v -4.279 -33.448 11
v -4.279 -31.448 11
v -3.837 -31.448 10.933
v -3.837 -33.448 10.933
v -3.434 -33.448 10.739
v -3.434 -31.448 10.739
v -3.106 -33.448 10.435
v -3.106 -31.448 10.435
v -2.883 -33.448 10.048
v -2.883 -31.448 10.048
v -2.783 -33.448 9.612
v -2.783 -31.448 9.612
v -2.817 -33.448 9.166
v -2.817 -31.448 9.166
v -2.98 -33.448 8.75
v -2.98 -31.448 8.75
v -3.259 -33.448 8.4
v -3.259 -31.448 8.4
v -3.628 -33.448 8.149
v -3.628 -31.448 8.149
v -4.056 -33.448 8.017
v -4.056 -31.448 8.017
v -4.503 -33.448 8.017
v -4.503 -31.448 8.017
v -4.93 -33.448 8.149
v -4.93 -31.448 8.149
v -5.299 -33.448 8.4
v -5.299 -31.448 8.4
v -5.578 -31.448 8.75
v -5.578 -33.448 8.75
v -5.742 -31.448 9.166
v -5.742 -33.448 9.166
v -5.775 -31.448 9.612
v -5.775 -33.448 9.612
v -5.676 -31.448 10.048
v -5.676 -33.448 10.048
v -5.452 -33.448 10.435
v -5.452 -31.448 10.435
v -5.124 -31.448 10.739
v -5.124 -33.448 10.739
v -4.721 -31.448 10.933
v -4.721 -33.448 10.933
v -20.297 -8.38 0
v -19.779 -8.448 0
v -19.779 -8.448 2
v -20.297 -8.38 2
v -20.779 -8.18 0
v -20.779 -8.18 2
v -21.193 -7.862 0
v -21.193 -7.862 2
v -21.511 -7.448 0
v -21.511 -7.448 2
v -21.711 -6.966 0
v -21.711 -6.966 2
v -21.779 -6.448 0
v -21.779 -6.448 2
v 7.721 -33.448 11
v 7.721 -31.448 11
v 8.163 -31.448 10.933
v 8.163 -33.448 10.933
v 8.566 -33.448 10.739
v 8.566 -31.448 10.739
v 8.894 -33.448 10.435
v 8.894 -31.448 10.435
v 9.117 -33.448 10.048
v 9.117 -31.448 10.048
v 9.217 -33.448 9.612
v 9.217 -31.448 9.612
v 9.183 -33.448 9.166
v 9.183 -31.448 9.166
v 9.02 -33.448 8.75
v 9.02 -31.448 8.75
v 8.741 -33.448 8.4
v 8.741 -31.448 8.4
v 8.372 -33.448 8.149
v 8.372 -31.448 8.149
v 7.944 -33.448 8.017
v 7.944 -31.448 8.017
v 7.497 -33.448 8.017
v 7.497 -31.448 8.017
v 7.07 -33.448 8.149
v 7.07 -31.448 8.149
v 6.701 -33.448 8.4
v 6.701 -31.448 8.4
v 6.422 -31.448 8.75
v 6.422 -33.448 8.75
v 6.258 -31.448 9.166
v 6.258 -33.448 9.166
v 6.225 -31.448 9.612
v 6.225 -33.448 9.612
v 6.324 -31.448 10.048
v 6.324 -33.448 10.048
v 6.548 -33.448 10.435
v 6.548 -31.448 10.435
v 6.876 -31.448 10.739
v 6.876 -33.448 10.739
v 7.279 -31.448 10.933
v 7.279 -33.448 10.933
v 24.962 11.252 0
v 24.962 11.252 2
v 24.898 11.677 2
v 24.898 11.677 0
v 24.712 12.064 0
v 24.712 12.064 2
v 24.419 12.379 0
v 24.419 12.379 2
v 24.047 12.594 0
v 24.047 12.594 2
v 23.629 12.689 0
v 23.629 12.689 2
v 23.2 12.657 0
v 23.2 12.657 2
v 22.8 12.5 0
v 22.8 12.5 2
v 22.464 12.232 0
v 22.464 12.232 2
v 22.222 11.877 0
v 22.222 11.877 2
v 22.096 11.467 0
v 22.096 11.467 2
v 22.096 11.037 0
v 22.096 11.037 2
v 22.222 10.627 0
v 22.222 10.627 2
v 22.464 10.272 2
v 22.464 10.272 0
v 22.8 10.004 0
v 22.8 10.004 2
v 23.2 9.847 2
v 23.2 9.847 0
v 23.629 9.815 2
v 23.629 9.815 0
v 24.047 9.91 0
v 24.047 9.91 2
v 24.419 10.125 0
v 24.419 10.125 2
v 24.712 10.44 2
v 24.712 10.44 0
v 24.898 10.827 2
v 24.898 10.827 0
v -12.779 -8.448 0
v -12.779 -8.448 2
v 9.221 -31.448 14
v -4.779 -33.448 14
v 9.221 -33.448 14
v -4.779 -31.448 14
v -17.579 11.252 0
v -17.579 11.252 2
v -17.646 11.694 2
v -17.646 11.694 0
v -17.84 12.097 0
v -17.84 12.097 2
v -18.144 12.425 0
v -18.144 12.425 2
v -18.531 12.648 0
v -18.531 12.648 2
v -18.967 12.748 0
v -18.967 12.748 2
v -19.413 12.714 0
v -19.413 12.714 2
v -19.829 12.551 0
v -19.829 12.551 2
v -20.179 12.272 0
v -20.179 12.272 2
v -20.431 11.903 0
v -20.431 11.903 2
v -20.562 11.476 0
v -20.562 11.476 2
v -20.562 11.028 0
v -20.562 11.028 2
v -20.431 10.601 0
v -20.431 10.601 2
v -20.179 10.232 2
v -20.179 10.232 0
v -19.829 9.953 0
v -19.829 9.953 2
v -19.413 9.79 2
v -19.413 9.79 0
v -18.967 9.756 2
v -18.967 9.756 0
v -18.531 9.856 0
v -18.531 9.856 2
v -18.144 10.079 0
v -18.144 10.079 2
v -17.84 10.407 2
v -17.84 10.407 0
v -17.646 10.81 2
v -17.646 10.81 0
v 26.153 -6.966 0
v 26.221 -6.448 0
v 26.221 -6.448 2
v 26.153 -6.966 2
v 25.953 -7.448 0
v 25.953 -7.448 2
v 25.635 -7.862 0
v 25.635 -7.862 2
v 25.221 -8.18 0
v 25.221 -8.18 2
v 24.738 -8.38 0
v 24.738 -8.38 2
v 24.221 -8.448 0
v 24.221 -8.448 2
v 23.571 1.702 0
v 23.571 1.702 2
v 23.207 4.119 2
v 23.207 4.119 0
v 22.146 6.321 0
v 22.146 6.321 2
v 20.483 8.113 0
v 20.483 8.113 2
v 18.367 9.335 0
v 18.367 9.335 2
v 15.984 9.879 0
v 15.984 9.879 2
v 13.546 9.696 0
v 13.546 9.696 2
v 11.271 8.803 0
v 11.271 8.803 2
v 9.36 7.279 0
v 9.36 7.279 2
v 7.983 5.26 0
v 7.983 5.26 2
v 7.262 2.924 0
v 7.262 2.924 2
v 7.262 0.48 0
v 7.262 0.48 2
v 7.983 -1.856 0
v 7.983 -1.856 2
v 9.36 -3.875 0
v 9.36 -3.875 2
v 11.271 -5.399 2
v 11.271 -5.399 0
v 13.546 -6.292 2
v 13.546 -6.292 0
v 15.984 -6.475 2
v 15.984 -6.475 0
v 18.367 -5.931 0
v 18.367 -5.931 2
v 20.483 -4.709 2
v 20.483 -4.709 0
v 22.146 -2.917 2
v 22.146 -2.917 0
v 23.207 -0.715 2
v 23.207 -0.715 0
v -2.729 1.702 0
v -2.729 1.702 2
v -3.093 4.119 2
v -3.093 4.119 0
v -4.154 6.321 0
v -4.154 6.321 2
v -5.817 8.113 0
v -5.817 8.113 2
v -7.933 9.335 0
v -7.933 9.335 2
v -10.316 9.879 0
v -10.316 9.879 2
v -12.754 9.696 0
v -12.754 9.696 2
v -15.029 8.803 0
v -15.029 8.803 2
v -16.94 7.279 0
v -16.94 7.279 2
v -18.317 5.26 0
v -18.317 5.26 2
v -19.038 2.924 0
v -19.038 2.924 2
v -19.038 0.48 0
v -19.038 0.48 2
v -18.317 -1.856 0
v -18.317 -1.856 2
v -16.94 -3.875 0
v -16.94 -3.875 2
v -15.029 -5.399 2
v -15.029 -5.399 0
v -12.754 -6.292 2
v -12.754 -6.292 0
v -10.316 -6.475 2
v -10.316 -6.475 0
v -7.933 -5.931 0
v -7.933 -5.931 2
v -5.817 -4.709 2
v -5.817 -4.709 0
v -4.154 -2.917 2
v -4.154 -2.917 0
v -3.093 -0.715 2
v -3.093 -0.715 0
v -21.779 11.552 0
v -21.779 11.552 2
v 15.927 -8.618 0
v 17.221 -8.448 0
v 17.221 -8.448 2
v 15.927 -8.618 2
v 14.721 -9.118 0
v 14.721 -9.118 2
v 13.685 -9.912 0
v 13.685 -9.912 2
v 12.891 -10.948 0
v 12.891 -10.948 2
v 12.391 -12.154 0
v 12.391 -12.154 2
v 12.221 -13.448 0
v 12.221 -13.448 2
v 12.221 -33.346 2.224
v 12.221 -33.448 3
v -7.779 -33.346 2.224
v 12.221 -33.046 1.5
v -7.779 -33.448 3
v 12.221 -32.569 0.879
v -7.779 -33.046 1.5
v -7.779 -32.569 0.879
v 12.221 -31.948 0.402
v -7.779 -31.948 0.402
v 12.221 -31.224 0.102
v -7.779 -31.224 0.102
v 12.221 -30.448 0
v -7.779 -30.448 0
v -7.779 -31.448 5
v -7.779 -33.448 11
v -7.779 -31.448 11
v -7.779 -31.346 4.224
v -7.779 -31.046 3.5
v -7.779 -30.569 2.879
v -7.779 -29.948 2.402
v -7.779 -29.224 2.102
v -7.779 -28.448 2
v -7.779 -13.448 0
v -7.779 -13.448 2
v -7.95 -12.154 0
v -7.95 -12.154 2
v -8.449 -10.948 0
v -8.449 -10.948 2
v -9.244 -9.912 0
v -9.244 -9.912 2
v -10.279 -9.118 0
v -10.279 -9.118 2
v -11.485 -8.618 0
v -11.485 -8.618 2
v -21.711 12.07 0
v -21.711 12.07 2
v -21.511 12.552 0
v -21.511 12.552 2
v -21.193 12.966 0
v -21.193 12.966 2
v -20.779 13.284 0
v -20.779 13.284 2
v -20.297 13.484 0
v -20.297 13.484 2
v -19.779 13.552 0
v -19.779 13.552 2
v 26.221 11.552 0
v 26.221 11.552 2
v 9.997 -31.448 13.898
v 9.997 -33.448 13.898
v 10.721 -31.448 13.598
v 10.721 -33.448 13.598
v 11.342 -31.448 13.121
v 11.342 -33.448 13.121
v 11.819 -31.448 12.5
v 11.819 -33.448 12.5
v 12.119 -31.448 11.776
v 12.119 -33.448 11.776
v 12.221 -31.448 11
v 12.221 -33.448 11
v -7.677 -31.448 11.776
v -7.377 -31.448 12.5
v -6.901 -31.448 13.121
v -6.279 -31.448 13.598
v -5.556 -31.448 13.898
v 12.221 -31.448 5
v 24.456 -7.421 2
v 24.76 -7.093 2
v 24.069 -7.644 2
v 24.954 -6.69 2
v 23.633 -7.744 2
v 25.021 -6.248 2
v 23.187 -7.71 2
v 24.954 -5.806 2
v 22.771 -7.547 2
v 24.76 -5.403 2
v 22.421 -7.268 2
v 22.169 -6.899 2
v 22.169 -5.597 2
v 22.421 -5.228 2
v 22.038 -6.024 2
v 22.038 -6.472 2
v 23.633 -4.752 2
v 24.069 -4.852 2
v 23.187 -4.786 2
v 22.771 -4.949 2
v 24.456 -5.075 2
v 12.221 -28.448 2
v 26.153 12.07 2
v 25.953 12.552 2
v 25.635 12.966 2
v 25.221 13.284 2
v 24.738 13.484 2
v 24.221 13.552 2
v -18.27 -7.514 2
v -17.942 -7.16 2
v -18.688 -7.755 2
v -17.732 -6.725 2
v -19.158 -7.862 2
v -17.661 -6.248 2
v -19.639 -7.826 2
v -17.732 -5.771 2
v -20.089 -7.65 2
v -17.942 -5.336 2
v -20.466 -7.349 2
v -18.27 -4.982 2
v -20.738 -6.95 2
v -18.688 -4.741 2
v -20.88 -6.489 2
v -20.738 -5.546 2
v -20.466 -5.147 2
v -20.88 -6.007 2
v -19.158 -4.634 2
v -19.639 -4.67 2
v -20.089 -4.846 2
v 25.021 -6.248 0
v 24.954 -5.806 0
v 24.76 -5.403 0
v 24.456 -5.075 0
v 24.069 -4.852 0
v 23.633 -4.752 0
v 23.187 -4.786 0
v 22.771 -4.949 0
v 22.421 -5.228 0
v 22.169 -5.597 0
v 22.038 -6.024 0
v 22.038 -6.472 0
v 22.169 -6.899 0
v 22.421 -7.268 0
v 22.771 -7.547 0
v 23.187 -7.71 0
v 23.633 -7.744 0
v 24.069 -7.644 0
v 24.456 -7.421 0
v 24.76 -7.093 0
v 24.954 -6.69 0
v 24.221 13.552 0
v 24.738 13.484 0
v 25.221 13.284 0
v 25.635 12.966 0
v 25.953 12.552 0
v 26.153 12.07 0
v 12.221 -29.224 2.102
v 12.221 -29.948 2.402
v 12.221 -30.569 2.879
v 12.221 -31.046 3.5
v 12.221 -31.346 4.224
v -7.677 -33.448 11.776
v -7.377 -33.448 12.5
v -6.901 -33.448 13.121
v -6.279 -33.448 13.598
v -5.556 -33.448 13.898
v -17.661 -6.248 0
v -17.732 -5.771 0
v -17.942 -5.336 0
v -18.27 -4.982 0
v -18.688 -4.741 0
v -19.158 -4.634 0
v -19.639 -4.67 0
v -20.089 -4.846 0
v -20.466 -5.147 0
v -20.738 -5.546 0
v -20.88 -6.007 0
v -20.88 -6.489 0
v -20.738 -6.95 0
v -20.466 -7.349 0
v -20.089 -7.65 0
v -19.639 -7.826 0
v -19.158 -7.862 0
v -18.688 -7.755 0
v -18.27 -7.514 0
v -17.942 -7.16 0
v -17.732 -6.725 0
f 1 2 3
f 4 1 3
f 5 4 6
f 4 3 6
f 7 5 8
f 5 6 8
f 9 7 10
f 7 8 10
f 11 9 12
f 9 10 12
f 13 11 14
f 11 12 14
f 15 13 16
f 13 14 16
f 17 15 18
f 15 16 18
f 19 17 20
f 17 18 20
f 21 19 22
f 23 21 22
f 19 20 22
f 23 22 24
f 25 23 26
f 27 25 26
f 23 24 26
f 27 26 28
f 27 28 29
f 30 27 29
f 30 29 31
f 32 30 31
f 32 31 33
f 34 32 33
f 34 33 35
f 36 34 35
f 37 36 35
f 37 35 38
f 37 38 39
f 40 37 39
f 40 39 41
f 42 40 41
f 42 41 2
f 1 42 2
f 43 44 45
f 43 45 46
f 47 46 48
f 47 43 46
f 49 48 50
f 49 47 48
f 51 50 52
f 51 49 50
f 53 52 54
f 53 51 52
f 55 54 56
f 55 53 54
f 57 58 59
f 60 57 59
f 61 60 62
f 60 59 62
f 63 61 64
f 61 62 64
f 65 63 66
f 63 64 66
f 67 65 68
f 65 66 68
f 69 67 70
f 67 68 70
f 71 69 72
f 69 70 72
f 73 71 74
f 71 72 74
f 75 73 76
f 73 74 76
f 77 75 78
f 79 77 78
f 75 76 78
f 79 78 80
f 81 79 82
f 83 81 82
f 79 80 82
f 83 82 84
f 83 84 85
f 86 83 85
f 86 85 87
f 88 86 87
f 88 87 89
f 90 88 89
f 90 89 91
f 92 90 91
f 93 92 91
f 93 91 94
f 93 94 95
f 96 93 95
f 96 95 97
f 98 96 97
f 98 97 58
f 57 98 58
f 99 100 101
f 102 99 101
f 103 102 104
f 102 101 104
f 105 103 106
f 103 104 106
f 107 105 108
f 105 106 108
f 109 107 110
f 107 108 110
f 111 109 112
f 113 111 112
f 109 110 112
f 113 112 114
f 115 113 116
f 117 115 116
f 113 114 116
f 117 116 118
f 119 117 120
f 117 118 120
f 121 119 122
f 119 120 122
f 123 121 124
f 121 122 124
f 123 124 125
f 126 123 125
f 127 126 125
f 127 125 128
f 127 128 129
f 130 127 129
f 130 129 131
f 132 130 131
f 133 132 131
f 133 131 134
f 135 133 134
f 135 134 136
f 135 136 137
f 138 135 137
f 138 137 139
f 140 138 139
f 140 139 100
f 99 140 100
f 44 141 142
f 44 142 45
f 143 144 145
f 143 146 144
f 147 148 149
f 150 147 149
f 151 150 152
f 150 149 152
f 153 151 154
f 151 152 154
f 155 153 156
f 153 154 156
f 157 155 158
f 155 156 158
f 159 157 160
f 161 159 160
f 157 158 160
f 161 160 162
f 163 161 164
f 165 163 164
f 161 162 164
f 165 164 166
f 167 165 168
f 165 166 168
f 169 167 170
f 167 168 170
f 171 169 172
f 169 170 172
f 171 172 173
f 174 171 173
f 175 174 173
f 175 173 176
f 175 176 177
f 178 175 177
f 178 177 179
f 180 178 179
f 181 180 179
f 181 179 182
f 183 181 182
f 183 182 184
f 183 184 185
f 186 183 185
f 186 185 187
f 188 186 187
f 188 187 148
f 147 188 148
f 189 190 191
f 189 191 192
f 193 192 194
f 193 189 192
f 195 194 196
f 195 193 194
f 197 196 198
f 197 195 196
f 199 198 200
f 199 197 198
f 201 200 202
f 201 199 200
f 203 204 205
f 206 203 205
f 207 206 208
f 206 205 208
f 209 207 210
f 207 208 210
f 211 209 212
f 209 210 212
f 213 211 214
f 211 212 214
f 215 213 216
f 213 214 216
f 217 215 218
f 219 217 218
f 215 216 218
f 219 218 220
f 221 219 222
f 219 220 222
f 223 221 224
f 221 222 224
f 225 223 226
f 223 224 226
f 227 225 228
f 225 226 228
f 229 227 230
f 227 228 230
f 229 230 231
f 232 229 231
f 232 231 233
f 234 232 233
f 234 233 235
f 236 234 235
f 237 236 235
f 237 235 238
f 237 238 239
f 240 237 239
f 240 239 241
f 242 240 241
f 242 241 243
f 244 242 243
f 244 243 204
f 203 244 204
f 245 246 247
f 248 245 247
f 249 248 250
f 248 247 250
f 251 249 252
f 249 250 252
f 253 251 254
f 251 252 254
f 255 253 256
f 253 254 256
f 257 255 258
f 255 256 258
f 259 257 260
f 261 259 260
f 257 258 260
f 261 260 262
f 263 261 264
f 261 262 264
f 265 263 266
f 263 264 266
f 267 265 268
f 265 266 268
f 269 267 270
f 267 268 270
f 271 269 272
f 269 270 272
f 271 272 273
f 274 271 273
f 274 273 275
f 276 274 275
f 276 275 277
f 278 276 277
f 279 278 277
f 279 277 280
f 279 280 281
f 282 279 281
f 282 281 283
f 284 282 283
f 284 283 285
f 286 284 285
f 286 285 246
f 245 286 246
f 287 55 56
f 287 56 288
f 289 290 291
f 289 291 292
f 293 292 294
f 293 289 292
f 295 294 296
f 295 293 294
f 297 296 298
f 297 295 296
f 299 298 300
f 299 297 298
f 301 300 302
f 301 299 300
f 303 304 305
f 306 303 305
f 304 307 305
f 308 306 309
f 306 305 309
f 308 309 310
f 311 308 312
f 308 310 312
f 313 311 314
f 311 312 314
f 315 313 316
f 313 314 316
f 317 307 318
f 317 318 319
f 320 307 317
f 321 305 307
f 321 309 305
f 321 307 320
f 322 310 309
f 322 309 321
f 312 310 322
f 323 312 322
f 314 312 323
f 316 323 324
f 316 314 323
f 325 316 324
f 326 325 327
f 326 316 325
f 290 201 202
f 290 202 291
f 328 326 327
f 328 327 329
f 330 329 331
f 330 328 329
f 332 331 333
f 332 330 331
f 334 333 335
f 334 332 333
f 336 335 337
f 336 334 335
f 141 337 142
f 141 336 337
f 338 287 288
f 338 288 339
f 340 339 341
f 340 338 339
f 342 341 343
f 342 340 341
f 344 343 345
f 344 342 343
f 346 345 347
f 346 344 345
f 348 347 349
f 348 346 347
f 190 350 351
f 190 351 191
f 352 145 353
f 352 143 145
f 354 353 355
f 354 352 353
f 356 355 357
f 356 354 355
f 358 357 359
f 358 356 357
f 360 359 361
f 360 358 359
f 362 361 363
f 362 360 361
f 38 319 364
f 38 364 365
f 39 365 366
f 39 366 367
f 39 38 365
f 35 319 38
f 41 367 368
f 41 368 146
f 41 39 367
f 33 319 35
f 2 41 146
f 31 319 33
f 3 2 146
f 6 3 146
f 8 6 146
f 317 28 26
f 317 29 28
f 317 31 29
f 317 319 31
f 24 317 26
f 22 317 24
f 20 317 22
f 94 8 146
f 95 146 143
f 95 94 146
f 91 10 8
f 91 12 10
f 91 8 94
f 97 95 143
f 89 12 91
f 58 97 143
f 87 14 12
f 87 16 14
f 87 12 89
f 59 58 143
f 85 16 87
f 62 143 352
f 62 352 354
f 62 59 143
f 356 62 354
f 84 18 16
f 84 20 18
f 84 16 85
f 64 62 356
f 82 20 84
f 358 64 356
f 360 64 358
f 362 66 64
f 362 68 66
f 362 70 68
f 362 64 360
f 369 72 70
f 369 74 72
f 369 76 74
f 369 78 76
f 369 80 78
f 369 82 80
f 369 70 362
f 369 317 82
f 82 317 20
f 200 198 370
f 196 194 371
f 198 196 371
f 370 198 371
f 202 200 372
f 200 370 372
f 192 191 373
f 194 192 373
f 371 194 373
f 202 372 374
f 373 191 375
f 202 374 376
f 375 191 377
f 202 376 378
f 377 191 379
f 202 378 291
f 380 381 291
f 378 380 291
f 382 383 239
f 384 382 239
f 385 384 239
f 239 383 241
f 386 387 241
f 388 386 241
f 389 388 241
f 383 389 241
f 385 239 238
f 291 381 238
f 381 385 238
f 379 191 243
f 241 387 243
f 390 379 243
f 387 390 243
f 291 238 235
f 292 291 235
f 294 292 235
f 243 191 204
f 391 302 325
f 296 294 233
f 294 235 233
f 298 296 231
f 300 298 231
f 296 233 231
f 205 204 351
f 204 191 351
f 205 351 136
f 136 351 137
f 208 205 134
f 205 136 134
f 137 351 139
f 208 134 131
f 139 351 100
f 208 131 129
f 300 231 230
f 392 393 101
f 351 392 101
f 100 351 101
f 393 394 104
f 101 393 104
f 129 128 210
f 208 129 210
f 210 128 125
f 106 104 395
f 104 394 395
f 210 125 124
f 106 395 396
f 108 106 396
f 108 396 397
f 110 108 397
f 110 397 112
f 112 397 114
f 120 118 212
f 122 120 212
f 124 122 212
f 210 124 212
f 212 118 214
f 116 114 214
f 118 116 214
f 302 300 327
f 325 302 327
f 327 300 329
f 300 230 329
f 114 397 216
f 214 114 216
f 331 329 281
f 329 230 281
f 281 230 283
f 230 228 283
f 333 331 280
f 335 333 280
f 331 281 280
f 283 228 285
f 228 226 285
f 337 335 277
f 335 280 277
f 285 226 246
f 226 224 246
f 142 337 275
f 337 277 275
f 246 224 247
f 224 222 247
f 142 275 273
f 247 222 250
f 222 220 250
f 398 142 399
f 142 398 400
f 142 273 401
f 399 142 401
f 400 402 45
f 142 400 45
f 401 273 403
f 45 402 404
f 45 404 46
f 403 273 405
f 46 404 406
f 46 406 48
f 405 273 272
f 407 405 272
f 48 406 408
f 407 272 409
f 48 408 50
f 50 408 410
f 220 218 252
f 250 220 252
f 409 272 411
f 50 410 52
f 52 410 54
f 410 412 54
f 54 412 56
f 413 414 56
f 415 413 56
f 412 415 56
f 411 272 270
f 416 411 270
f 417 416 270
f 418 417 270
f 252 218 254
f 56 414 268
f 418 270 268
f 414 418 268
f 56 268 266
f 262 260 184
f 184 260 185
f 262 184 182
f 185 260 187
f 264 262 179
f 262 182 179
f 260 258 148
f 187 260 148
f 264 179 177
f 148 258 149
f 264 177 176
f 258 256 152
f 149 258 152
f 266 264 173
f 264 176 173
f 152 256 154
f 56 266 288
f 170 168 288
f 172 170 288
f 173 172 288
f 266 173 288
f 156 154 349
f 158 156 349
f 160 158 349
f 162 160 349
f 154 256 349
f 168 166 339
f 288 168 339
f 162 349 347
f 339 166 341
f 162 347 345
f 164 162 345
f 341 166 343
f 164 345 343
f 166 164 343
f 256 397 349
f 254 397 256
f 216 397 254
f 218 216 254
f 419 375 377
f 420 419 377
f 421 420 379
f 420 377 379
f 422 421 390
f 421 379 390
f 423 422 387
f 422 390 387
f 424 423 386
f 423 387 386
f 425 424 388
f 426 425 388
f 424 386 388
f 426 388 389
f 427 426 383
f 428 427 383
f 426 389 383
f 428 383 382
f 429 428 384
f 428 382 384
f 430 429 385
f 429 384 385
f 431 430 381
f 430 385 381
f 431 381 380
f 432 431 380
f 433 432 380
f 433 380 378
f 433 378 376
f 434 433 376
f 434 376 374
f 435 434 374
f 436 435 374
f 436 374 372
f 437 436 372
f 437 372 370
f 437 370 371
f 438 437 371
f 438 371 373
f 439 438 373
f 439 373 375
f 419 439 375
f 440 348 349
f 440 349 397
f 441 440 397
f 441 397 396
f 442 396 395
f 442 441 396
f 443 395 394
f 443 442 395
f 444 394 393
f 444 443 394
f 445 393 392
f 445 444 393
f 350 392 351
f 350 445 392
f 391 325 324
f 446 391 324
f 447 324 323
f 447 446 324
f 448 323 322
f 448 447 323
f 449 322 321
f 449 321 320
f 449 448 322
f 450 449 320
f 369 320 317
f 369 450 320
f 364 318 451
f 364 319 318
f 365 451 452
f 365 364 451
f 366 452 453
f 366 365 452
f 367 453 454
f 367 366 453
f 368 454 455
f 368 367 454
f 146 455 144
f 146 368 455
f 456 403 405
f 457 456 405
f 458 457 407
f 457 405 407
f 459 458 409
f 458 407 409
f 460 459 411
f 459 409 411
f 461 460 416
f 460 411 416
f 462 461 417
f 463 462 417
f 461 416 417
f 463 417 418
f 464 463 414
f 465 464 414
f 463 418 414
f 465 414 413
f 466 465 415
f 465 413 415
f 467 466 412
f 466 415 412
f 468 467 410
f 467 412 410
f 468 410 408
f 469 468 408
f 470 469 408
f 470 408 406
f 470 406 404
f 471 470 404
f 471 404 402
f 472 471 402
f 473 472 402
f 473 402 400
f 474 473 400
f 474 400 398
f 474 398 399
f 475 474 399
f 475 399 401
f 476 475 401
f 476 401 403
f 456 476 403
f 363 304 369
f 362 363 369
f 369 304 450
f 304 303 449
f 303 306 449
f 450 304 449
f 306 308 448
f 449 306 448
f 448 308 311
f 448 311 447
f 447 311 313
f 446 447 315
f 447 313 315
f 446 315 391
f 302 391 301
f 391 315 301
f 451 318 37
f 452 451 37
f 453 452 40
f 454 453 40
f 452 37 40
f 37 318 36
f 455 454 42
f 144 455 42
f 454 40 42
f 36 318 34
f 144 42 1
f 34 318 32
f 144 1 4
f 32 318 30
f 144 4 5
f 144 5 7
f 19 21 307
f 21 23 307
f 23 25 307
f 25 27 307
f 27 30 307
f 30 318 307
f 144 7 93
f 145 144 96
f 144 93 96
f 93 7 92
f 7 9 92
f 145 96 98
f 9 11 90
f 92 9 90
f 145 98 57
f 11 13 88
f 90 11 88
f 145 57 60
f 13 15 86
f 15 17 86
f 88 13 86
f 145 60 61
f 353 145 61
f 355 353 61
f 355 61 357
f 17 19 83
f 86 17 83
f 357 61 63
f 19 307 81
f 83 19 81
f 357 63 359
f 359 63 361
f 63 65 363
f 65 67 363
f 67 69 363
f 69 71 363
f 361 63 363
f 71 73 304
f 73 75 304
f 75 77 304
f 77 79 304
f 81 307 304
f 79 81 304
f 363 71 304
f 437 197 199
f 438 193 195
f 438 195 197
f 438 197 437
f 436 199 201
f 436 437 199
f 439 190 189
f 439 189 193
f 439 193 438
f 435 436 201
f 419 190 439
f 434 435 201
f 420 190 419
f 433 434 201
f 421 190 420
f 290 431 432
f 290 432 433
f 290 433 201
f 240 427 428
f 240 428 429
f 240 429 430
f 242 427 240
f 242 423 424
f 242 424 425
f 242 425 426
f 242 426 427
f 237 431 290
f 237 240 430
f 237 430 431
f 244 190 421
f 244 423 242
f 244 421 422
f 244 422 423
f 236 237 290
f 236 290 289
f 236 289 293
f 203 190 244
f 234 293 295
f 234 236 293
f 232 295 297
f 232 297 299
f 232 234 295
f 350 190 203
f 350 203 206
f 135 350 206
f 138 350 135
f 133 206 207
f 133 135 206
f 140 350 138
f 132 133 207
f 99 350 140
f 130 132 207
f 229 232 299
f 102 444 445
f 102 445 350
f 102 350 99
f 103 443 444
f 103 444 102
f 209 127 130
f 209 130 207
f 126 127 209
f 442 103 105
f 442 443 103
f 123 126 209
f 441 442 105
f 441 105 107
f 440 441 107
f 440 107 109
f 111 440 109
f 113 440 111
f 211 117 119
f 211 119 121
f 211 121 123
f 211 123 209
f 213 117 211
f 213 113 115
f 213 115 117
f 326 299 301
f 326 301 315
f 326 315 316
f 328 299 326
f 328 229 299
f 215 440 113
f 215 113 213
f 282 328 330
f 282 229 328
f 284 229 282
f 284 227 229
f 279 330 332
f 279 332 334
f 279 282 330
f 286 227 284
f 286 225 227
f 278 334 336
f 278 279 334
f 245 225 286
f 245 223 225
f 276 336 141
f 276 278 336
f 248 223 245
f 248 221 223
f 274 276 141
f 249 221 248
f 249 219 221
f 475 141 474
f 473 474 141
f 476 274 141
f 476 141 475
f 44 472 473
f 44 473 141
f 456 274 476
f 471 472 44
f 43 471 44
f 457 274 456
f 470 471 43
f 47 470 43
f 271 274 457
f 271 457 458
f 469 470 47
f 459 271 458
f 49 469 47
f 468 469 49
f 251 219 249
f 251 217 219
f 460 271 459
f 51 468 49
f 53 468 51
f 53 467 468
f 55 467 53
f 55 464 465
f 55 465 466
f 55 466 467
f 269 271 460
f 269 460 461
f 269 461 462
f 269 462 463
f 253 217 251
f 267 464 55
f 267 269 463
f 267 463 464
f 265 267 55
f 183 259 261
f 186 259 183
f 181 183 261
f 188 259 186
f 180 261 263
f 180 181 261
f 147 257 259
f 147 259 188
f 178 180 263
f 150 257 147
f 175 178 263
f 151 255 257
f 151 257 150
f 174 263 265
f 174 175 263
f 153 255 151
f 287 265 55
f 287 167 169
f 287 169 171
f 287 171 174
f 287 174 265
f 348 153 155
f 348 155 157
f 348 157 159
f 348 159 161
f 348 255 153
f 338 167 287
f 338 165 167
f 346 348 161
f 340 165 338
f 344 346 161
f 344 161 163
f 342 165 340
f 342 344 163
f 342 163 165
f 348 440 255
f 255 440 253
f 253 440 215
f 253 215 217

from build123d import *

# Parameters (mm, degrees)
BOSS_EXTRUDE1_DEPTH = 2
SKETCH3_R           = 8.2
CUT_EXTRUDE2_DEPTH  = 43.547600128
SKETCH4_R           = 1.5
SKETCH4_R_2         = 1.618660888
SKETCH4_R_3         = 1.441296675
CUT_EXTRUDE3_DEPTH  = 43.547600128
SKETCH6_W           = 20
SKETCH6_H           = 2
BOSS_EXTRUDE2_DEPTH = 12
FILLET1_R           = 3
FILLET2_R           = 3
SKETCH7_R           = 1.5
CUT_EXTRUDE4_DEPTH  = 54.930795553
FILLET3_R           = 3


with BuildPart() as part:
    # Sketch1 → Boss-Extrude1 (new body)
    with BuildSketch(Plane.XY):
        with BuildLine():
            Line((-19.779193206, 13.552016985), (24.220806794, 13.552016985))
            ThreePointArc((24.220806794, 13.552016985), (25.635020356, 12.966230548), (26.220806794, 11.552016985))
            Line((26.220806794, 11.552016985), (26.220806794, -6.447983015))
            ThreePointArc((26.220806794, -6.447983015), (25.635020356, -7.862196577), (24.220806794, -8.447983015))
            Line((24.220806794, -8.447983015), (17.220806794, -8.447983015))
            ThreePointArc((17.220806794, -8.447983015), (13.685272888, -9.912449109), (12.220806794, -13.447983015))
            Line((12.220806794, -13.447983015), (12.220806794, -33.447983015))
            Line((12.220806794, -33.447983015), (-7.779193206, -33.447983015))
            Line((-7.779193206, -33.447983015), (-7.779193206, -13.447983015))
            ThreePointArc((-7.779193206, -13.447983015), (-9.2436593, -9.912449109), (-12.779193206, -8.447983015))
            Line((-12.779193206, -8.447983015), (-19.779193206, -8.447983015))
            ThreePointArc((-19.779193206, -8.447983015), (-21.193406768, -7.862196577), (-21.779193206, -6.447983015))
            Line((-21.779193206, -6.447983015), (-21.779193206, 11.552016985))
            ThreePointArc((-21.779193206, 11.552016985), (-21.193406768, 12.966230548), (-19.779193206, 13.552016985))
        make_face()
    extrude(amount=BOSS_EXTRUDE1_DEPTH)

    # Sketch3 → Cut-Extrude2 (cut, through all)
    with BuildSketch(Plane.XY.offset(2)):
        with Locations((-10.929193206, 1.702016985)):
            Circle(SKETCH3_R)
        with Locations((15.370806794, 1.702016985)):
            Circle(SKETCH3_R)
    extrude(amount=-CUT_EXTRUDE2_DEPTH, mode=Mode.SUBTRACT)

    # Sketch4 → Cut-Extrude3 (cut, through all)
    with BuildSketch(Plane.XY.offset(2)):
        with Locations((-19.079193206, 11.252016985)):
            Circle(SKETCH4_R)
        with Locations((-19.279193206, -6.247983015)):
            Circle(SKETCH4_R_2)
        with Locations((23.520806794, 11.252016985)):
            Circle(SKETCH4_R_3)
        with Locations((23.520806794, -6.247983015)):
            Circle(SKETCH4_R)
    extrude(amount=-CUT_EXTRUDE3_DEPTH, mode=Mode.SUBTRACT)

    # Sketch6 → Boss-Extrude2 (add)
    with BuildSketch(Plane.XY.offset(2)):
        with Locations((2.220806794, -32.447983015)):
            Rectangle(SKETCH6_W, SKETCH6_H)
    extrude(amount=BOSS_EXTRUDE2_DEPTH)

    # Fillet1
    fillet1_edges = [part.edges().sort_by_distance(p)[0] for p in [
        (2.220806794, -33.447983015, 0),
    ]]
    fillet(fillet1_edges, radius=FILLET1_R)

    # Fillet2
    fillet2_edges = [part.edges().sort_by_distance(p)[0] for p in [
        (2.220806794, -31.447983015, 2),
    ]]
    fillet(fillet2_edges, radius=FILLET2_R)

    # Sketch7 → Cut-Extrude4 (cut, through all)
    with BuildSketch(Plane(origin=(0, -31.447983015, 0), x_dir=(1, 0, 0), z_dir=(0, 1, 0))):
        with Locations(Location((-4.279193206, -9.5, 0), (0, 0, 270))):
            Circle(SKETCH7_R)
        with Locations(Location((7.720806794, -9.5, 0), (0, 0, 270))):
            Circle(SKETCH7_R)
    extrude(amount=-CUT_EXTRUDE4_DEPTH, mode=Mode.SUBTRACT)

    # Fillet3
    fillet3_edges = [part.edges().sort_by_distance(p)[0] for p in [
        (-7.779193206, -32.447983015, 14),
        (12.220806794, -32.447983015, 14),
    ]]
    fillet(fillet3_edges, radius=FILLET3_R)


solid = part.part
